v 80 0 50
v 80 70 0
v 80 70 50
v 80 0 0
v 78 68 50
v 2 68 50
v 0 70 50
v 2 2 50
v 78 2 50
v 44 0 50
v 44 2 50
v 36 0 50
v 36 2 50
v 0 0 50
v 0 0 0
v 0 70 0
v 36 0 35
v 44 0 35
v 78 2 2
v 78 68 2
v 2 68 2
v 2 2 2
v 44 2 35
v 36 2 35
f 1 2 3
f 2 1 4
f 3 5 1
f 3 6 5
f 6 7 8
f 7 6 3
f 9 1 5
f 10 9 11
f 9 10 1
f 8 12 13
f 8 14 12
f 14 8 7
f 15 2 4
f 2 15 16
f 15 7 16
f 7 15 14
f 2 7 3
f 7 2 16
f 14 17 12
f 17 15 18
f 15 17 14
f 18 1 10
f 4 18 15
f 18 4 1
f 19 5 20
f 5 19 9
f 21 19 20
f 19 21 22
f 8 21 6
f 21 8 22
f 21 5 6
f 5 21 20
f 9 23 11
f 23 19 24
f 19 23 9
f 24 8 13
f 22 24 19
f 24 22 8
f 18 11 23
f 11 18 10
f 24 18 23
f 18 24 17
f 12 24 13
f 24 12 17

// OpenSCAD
$fn = 32;

// ----------------------------------------------------------------------
// Enclosure box: notch enclosure
// ----------------------------------------------------------------------

// --- parameters (mm) ---
box_l = 80;               // outer length, X
box_w = 70;               // outer width, Y
box_h = 50;               // outer height
wall_t = 2;               // wall thickness
notch_w = 8;              // cable notch width
notch_h = 15;             // cable notch height

inner_h = box_h - wall_t;  // cavity depth
boss_h = inner_h - 2;  // corner boss height

difference() {
  union() {
    difference() {
      cube([box_l, box_w, box_h]);
      translate([wall_t, wall_t, wall_t])
        cube([box_l - 2 * wall_t, box_w - 2 * wall_t, box_h]);
    }
  }
  translate([box_l / 2 - notch_w / 2, -1, box_h - notch_h])
    cube([notch_w, wall_t + 2, notch_h + 1]);
}
